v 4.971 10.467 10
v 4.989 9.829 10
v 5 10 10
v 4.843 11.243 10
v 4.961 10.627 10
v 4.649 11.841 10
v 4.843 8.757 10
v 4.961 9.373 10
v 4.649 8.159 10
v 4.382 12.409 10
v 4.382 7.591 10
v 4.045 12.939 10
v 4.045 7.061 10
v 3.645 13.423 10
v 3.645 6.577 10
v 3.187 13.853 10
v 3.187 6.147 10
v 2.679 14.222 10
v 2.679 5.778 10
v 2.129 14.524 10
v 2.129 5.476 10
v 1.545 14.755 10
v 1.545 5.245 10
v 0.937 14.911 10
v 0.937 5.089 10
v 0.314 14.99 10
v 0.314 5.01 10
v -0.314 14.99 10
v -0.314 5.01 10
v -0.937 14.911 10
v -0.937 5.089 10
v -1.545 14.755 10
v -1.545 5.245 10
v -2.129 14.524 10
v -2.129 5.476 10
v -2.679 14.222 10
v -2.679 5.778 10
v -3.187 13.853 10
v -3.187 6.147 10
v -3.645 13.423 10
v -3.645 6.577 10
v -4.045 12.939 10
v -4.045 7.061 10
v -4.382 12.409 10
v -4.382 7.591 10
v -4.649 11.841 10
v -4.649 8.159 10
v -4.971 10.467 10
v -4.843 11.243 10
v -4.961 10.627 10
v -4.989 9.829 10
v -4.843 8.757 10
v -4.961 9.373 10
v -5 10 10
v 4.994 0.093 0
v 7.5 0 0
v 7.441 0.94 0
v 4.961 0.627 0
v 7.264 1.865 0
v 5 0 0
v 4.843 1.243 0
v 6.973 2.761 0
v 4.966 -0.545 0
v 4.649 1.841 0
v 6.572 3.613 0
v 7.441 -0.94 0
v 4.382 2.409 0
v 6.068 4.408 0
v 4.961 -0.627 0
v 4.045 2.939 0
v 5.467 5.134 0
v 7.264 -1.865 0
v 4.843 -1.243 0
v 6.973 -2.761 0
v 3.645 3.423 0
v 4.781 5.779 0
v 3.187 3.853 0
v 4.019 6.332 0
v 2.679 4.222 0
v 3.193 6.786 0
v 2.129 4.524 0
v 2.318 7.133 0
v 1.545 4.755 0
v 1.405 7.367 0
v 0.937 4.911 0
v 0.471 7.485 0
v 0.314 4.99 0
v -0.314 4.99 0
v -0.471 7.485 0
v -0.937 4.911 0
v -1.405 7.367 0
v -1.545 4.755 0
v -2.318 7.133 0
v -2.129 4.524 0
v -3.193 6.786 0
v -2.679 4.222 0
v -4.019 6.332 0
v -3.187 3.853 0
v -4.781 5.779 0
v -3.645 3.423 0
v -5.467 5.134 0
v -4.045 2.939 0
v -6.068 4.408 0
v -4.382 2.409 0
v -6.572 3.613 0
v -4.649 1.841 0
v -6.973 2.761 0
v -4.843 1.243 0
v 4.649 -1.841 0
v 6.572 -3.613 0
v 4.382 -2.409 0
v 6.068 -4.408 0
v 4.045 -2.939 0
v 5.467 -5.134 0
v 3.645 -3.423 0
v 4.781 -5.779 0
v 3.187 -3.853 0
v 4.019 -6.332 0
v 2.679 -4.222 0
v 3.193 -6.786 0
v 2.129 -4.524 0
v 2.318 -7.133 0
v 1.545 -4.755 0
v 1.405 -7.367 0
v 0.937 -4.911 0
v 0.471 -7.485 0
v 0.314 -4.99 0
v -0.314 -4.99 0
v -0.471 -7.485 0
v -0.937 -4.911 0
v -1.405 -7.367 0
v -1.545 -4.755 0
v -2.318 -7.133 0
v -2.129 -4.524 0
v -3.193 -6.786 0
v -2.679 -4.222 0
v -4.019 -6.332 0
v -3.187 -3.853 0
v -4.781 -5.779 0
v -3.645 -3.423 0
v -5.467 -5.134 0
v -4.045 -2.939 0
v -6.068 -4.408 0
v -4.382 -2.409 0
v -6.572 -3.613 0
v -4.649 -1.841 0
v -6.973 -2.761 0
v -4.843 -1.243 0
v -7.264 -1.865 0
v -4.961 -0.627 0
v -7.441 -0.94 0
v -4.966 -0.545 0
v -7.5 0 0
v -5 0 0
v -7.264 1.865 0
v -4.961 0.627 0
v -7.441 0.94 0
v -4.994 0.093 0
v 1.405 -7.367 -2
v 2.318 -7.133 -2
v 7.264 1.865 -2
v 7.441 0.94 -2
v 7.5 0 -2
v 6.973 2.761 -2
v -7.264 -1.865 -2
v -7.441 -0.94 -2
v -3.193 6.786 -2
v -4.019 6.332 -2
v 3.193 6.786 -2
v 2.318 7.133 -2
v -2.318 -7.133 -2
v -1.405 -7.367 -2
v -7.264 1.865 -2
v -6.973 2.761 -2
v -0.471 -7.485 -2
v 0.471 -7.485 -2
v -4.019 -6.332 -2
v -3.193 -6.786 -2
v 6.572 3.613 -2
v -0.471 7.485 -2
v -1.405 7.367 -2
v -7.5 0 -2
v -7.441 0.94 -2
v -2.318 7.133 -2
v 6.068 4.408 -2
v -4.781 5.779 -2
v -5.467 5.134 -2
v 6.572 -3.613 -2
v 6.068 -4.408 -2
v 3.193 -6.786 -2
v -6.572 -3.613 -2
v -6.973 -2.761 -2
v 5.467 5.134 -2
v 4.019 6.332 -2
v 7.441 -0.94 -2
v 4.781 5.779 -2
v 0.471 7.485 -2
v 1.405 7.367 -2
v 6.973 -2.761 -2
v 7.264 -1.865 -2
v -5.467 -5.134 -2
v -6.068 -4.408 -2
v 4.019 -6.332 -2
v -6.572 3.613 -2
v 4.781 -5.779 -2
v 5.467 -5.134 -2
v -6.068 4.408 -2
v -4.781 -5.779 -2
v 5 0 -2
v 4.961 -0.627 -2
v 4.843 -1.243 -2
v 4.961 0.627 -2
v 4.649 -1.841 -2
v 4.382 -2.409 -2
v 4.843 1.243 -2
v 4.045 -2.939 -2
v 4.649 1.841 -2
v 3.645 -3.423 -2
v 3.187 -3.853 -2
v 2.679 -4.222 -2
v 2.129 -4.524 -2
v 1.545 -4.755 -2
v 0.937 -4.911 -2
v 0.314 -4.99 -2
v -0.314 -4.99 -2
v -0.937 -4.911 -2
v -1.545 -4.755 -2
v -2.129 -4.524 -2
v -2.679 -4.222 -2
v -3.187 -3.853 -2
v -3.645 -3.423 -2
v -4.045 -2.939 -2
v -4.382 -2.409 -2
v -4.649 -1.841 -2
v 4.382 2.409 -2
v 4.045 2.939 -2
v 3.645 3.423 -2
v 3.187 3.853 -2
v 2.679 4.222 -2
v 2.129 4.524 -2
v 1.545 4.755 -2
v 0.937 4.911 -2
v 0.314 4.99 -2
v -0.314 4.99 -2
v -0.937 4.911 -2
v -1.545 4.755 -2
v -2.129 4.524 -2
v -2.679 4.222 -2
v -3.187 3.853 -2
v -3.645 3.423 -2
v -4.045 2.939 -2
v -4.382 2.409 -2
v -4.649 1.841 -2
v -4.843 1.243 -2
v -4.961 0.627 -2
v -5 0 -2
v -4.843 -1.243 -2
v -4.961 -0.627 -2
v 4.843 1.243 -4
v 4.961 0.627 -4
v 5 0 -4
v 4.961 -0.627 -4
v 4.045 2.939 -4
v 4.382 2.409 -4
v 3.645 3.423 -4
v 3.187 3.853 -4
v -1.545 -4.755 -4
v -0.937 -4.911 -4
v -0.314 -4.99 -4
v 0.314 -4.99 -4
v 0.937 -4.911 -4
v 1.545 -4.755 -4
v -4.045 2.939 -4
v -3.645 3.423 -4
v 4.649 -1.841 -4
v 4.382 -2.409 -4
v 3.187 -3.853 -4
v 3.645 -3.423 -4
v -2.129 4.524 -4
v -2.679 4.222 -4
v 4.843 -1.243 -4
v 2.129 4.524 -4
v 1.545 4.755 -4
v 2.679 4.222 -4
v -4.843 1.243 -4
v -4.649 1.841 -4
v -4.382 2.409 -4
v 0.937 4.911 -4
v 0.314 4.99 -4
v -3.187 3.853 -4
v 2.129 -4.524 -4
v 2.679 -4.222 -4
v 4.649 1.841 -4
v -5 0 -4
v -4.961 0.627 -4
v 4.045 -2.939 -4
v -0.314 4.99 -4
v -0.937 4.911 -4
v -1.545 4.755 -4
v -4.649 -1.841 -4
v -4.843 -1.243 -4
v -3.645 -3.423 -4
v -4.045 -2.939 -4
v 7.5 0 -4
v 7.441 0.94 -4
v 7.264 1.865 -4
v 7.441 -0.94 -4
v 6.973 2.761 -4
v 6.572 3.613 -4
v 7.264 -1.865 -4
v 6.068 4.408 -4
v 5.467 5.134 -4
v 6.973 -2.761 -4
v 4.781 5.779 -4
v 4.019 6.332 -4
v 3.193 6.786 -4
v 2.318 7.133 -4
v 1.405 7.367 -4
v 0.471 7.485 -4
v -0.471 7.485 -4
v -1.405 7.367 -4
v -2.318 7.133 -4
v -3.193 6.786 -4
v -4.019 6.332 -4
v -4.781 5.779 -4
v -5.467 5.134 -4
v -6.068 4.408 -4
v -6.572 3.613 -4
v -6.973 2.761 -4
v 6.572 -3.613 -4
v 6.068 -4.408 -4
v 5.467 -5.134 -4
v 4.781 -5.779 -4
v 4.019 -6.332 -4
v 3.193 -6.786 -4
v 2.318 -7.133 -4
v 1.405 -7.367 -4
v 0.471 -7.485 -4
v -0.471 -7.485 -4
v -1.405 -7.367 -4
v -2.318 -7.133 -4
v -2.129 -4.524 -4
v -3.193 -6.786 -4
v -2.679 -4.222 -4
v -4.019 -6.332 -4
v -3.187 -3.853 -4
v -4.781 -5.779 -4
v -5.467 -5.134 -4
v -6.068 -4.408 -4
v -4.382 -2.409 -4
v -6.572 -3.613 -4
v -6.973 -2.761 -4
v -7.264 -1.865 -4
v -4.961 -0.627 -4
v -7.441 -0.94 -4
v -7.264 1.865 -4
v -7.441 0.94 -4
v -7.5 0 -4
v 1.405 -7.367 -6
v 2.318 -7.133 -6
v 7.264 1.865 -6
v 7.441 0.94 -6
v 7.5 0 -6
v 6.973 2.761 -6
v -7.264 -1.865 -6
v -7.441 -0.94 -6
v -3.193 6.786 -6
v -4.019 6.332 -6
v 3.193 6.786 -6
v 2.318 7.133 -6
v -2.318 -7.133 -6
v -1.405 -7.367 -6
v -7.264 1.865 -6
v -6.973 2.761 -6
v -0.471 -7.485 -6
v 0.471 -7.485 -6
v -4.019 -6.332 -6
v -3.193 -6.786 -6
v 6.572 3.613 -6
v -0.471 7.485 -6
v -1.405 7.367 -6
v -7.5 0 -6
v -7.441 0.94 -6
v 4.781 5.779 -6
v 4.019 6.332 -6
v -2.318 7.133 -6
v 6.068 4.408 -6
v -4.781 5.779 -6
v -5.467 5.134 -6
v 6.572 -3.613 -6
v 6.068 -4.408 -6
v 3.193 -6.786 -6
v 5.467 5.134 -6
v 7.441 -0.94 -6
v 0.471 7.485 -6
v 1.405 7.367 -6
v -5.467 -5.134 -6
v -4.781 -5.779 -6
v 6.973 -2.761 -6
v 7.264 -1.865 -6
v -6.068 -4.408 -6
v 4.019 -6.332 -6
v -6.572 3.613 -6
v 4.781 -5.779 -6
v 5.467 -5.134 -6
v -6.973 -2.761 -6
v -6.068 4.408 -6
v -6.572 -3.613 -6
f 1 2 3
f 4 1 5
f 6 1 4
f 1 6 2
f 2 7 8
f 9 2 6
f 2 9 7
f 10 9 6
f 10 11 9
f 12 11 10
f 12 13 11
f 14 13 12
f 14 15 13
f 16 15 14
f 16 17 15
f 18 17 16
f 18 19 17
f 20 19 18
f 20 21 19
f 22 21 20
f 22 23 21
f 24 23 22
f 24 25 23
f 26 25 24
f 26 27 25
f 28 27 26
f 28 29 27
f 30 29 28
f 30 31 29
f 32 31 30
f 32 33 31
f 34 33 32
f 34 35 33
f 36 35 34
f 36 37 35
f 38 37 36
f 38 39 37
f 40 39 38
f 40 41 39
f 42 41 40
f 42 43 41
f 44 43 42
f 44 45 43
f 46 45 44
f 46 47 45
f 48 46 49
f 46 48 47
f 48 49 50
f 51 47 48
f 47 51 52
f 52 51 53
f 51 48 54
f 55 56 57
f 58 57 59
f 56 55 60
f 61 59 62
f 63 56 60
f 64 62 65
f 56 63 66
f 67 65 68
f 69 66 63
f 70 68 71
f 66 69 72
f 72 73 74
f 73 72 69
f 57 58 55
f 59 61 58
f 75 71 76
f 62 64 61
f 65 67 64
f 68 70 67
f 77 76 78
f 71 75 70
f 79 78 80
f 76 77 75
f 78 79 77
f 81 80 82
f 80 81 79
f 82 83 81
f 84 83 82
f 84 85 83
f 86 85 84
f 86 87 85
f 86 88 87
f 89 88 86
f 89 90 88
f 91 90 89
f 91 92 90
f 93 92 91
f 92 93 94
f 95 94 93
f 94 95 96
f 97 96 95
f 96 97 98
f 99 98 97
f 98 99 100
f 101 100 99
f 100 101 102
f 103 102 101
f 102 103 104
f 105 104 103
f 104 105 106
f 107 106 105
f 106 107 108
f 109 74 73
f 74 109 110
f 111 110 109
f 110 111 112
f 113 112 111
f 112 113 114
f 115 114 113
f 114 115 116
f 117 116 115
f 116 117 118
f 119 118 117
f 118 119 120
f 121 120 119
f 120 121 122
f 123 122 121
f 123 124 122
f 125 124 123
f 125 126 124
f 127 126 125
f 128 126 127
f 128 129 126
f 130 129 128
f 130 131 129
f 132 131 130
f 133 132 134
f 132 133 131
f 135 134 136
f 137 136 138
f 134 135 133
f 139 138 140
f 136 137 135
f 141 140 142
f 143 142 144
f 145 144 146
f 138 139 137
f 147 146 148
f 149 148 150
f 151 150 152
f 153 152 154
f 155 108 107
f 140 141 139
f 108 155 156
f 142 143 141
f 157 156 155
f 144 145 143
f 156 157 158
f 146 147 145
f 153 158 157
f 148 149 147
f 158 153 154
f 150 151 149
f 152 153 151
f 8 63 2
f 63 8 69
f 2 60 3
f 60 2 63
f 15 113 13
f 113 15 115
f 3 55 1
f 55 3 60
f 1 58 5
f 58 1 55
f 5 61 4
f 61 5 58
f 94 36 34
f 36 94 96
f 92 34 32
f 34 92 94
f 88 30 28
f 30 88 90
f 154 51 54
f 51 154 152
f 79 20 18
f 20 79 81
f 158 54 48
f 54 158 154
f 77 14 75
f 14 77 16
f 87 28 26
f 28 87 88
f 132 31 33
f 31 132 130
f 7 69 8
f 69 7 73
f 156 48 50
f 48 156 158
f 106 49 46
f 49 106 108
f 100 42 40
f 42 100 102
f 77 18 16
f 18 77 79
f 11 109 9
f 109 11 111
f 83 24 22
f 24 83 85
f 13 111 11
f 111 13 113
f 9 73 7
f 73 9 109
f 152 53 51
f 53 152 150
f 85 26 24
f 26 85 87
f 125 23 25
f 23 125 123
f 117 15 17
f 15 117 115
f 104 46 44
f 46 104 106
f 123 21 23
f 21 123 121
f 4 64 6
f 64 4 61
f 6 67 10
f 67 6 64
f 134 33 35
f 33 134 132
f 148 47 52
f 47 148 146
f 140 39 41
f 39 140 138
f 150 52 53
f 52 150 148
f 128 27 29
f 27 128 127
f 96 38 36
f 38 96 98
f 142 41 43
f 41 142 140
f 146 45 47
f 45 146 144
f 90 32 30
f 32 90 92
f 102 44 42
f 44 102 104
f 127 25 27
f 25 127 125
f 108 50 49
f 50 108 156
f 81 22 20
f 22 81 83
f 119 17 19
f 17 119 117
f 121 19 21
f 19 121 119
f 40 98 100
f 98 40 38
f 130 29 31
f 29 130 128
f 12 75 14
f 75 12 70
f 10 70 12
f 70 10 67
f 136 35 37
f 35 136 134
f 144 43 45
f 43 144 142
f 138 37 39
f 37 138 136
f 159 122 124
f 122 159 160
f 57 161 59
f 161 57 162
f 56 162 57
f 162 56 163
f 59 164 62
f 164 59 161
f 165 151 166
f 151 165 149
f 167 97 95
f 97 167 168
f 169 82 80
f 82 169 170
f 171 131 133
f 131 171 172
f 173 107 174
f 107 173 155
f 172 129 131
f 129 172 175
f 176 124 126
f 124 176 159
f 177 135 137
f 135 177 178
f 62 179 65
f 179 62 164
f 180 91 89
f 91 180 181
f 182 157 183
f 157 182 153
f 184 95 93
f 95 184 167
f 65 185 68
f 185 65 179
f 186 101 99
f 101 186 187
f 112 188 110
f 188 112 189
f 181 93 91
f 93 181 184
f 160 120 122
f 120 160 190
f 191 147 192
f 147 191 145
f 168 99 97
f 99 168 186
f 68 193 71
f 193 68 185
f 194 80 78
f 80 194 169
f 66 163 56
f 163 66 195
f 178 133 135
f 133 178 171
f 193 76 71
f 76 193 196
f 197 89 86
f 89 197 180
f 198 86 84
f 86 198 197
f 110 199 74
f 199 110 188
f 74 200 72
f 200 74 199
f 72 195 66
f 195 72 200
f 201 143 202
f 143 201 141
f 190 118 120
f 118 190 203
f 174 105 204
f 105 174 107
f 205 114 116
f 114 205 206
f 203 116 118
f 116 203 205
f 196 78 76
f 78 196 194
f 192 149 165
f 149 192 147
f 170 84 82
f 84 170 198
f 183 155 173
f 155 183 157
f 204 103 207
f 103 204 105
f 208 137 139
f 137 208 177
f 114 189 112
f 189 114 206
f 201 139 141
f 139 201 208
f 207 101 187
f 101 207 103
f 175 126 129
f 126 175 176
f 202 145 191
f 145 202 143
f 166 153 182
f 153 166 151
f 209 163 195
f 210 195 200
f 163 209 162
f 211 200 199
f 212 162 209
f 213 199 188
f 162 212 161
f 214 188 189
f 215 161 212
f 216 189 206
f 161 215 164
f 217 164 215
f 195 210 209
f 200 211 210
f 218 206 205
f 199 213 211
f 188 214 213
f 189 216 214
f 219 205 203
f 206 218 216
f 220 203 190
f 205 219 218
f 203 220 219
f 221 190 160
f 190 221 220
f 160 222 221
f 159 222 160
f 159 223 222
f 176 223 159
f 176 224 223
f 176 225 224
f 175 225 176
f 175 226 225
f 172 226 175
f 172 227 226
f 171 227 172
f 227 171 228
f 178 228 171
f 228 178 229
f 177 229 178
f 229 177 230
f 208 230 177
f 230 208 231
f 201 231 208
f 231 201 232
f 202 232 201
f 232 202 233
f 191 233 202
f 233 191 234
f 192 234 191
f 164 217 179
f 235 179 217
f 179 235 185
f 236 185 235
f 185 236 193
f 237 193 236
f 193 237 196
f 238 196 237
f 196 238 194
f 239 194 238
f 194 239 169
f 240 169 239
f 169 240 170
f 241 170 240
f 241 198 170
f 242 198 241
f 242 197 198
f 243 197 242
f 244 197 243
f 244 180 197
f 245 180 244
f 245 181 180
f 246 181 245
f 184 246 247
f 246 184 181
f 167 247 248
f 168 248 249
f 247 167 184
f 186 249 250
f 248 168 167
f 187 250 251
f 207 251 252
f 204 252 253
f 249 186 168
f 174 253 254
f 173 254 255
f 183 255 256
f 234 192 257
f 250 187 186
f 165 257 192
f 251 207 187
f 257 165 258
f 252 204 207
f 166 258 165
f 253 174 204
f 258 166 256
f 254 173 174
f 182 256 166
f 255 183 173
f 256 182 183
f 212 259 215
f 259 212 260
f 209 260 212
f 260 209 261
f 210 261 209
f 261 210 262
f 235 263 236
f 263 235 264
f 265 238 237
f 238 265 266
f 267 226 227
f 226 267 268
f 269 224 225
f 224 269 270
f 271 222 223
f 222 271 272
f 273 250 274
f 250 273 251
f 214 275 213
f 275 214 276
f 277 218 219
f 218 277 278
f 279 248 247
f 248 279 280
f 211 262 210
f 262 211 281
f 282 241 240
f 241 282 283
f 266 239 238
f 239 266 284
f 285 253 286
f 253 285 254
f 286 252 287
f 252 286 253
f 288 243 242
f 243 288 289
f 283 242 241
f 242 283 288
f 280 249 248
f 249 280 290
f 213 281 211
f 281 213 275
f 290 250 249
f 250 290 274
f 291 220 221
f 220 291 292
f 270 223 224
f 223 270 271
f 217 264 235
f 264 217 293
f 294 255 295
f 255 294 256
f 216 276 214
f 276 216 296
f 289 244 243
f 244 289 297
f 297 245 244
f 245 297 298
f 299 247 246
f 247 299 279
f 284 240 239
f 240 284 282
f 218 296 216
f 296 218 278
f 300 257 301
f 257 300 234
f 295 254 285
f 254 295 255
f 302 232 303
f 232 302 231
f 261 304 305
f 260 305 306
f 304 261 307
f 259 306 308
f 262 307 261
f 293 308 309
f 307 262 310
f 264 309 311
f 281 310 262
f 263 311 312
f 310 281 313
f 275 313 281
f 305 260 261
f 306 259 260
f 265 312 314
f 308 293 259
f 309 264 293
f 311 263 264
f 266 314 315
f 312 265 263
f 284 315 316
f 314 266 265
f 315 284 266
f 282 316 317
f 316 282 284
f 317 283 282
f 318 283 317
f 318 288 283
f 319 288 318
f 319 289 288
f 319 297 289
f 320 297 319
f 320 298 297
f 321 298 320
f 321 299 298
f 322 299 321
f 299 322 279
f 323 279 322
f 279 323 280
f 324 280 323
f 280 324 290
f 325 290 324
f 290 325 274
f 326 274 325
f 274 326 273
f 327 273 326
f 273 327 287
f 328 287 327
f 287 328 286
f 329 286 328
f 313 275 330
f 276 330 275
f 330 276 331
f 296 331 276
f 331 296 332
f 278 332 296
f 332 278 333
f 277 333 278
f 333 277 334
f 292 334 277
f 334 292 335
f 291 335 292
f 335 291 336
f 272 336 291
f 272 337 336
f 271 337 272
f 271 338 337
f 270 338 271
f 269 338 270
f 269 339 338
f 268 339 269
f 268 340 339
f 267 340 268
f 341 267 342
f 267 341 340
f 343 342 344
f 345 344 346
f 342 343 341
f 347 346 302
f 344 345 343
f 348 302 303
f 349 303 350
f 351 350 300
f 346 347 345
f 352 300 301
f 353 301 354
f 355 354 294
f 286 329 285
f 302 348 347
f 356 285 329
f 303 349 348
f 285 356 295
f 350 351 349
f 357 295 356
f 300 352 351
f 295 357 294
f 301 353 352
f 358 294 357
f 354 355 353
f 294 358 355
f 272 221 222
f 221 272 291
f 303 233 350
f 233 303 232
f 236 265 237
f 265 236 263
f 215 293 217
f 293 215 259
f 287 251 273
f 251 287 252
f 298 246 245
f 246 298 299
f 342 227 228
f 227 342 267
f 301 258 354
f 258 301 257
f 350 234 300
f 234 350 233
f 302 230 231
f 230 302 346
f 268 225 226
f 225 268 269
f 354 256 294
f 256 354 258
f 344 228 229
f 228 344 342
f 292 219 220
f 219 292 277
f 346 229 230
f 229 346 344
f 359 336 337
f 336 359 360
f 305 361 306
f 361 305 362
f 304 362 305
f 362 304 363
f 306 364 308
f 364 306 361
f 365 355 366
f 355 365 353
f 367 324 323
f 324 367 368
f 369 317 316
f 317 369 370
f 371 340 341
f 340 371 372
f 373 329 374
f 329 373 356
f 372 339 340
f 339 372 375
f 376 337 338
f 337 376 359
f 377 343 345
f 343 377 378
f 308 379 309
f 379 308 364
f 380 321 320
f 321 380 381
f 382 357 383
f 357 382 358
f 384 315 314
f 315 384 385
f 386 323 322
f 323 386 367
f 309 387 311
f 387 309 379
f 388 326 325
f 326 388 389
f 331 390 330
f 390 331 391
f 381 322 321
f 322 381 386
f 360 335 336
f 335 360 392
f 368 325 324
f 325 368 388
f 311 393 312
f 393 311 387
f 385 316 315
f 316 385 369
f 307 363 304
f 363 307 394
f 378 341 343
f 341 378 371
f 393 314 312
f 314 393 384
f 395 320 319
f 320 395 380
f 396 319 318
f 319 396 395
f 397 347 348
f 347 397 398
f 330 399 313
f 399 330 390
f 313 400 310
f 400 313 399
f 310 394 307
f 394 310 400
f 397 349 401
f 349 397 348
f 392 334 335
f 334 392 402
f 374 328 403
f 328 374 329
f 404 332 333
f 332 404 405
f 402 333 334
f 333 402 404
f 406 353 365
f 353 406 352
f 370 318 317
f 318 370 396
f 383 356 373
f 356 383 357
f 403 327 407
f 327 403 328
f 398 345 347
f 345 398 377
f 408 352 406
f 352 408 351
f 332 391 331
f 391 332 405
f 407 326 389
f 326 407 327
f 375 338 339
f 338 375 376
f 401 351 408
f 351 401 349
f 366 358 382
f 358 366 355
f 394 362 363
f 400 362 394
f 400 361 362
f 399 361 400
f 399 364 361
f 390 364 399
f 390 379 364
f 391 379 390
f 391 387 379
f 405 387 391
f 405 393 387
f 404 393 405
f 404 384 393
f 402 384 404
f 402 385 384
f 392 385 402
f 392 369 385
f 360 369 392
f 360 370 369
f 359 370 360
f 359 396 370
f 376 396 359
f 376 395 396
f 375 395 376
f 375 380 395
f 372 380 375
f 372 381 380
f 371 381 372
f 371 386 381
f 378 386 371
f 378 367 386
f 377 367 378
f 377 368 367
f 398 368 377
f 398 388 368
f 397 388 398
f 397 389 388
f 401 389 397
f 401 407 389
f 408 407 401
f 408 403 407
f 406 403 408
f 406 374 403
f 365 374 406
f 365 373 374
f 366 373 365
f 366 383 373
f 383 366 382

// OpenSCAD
$fn = 50;

thickness = 2;

opening = 10;
rim = 15;

angle = 45;



color("pink")
union() {
    arm(0);
    grommetAttachment();
    //fingerAttachment();
}

module grommetAttachment() {
    union() {
        translate([0, 0, -thickness]) cylinder(h=thickness, d=rim);
        translate([0, 0, -thickness * 2]) cylinder(h=thickness, d=opening);
        translate([0, 0, -thickness * 3]) cylinder(h=thickness, d=rim);
    }
}

module arm(isHollow = 1) {
    
    support = 10;
    
    x = (opening) * sin(angle)  ;
    
    translate([0, -opening/2, 0])
    union() {
        intersection() {
            
            translate([-opening/2, 0, 0])
            cube([opening, opening + 2*x, opening ]);
            
            translate([0,x*sin(angle)/2,-x*sin(angle)/2])
            rotate([-angle,0,0]) {
                linear_extrude(height=support+support/sin(angle))
                scale([1, sin(angle)])
                {
                    difference() {
                        circle(d=opening);
                        
                        if(isHollow == 1) {
                            offset(delta=-thickness) circle(d=opening);
                        }
                    }
                }
            }
        }
        
    }
}

module fingerAttachment() {
    catch = 2; 
    insert = 5;
    
    translate([0, opening/2, -(insert+catch)])
    {
        difference() {
            union() {
                cylinder(d=opening, h=(insert+catch));
                cylinder(d1=opening, d2=(opening+catch),h=catch);
            }
            
            union() {
                cylinder(d=opening-thickness, h=(insert+catch));
                
                translate([0, 0, (insert+catch)/2]) {
                    cube([opening-3*thickness, opening + catch, (insert+catch)], center = true);
                }
                
                translate([0, 0, (insert+catch)/2]) {
                    cube([opening + catch, opening-3*thickness, (insert+catch)], center = true);
                }
            }
        }
    }
}
